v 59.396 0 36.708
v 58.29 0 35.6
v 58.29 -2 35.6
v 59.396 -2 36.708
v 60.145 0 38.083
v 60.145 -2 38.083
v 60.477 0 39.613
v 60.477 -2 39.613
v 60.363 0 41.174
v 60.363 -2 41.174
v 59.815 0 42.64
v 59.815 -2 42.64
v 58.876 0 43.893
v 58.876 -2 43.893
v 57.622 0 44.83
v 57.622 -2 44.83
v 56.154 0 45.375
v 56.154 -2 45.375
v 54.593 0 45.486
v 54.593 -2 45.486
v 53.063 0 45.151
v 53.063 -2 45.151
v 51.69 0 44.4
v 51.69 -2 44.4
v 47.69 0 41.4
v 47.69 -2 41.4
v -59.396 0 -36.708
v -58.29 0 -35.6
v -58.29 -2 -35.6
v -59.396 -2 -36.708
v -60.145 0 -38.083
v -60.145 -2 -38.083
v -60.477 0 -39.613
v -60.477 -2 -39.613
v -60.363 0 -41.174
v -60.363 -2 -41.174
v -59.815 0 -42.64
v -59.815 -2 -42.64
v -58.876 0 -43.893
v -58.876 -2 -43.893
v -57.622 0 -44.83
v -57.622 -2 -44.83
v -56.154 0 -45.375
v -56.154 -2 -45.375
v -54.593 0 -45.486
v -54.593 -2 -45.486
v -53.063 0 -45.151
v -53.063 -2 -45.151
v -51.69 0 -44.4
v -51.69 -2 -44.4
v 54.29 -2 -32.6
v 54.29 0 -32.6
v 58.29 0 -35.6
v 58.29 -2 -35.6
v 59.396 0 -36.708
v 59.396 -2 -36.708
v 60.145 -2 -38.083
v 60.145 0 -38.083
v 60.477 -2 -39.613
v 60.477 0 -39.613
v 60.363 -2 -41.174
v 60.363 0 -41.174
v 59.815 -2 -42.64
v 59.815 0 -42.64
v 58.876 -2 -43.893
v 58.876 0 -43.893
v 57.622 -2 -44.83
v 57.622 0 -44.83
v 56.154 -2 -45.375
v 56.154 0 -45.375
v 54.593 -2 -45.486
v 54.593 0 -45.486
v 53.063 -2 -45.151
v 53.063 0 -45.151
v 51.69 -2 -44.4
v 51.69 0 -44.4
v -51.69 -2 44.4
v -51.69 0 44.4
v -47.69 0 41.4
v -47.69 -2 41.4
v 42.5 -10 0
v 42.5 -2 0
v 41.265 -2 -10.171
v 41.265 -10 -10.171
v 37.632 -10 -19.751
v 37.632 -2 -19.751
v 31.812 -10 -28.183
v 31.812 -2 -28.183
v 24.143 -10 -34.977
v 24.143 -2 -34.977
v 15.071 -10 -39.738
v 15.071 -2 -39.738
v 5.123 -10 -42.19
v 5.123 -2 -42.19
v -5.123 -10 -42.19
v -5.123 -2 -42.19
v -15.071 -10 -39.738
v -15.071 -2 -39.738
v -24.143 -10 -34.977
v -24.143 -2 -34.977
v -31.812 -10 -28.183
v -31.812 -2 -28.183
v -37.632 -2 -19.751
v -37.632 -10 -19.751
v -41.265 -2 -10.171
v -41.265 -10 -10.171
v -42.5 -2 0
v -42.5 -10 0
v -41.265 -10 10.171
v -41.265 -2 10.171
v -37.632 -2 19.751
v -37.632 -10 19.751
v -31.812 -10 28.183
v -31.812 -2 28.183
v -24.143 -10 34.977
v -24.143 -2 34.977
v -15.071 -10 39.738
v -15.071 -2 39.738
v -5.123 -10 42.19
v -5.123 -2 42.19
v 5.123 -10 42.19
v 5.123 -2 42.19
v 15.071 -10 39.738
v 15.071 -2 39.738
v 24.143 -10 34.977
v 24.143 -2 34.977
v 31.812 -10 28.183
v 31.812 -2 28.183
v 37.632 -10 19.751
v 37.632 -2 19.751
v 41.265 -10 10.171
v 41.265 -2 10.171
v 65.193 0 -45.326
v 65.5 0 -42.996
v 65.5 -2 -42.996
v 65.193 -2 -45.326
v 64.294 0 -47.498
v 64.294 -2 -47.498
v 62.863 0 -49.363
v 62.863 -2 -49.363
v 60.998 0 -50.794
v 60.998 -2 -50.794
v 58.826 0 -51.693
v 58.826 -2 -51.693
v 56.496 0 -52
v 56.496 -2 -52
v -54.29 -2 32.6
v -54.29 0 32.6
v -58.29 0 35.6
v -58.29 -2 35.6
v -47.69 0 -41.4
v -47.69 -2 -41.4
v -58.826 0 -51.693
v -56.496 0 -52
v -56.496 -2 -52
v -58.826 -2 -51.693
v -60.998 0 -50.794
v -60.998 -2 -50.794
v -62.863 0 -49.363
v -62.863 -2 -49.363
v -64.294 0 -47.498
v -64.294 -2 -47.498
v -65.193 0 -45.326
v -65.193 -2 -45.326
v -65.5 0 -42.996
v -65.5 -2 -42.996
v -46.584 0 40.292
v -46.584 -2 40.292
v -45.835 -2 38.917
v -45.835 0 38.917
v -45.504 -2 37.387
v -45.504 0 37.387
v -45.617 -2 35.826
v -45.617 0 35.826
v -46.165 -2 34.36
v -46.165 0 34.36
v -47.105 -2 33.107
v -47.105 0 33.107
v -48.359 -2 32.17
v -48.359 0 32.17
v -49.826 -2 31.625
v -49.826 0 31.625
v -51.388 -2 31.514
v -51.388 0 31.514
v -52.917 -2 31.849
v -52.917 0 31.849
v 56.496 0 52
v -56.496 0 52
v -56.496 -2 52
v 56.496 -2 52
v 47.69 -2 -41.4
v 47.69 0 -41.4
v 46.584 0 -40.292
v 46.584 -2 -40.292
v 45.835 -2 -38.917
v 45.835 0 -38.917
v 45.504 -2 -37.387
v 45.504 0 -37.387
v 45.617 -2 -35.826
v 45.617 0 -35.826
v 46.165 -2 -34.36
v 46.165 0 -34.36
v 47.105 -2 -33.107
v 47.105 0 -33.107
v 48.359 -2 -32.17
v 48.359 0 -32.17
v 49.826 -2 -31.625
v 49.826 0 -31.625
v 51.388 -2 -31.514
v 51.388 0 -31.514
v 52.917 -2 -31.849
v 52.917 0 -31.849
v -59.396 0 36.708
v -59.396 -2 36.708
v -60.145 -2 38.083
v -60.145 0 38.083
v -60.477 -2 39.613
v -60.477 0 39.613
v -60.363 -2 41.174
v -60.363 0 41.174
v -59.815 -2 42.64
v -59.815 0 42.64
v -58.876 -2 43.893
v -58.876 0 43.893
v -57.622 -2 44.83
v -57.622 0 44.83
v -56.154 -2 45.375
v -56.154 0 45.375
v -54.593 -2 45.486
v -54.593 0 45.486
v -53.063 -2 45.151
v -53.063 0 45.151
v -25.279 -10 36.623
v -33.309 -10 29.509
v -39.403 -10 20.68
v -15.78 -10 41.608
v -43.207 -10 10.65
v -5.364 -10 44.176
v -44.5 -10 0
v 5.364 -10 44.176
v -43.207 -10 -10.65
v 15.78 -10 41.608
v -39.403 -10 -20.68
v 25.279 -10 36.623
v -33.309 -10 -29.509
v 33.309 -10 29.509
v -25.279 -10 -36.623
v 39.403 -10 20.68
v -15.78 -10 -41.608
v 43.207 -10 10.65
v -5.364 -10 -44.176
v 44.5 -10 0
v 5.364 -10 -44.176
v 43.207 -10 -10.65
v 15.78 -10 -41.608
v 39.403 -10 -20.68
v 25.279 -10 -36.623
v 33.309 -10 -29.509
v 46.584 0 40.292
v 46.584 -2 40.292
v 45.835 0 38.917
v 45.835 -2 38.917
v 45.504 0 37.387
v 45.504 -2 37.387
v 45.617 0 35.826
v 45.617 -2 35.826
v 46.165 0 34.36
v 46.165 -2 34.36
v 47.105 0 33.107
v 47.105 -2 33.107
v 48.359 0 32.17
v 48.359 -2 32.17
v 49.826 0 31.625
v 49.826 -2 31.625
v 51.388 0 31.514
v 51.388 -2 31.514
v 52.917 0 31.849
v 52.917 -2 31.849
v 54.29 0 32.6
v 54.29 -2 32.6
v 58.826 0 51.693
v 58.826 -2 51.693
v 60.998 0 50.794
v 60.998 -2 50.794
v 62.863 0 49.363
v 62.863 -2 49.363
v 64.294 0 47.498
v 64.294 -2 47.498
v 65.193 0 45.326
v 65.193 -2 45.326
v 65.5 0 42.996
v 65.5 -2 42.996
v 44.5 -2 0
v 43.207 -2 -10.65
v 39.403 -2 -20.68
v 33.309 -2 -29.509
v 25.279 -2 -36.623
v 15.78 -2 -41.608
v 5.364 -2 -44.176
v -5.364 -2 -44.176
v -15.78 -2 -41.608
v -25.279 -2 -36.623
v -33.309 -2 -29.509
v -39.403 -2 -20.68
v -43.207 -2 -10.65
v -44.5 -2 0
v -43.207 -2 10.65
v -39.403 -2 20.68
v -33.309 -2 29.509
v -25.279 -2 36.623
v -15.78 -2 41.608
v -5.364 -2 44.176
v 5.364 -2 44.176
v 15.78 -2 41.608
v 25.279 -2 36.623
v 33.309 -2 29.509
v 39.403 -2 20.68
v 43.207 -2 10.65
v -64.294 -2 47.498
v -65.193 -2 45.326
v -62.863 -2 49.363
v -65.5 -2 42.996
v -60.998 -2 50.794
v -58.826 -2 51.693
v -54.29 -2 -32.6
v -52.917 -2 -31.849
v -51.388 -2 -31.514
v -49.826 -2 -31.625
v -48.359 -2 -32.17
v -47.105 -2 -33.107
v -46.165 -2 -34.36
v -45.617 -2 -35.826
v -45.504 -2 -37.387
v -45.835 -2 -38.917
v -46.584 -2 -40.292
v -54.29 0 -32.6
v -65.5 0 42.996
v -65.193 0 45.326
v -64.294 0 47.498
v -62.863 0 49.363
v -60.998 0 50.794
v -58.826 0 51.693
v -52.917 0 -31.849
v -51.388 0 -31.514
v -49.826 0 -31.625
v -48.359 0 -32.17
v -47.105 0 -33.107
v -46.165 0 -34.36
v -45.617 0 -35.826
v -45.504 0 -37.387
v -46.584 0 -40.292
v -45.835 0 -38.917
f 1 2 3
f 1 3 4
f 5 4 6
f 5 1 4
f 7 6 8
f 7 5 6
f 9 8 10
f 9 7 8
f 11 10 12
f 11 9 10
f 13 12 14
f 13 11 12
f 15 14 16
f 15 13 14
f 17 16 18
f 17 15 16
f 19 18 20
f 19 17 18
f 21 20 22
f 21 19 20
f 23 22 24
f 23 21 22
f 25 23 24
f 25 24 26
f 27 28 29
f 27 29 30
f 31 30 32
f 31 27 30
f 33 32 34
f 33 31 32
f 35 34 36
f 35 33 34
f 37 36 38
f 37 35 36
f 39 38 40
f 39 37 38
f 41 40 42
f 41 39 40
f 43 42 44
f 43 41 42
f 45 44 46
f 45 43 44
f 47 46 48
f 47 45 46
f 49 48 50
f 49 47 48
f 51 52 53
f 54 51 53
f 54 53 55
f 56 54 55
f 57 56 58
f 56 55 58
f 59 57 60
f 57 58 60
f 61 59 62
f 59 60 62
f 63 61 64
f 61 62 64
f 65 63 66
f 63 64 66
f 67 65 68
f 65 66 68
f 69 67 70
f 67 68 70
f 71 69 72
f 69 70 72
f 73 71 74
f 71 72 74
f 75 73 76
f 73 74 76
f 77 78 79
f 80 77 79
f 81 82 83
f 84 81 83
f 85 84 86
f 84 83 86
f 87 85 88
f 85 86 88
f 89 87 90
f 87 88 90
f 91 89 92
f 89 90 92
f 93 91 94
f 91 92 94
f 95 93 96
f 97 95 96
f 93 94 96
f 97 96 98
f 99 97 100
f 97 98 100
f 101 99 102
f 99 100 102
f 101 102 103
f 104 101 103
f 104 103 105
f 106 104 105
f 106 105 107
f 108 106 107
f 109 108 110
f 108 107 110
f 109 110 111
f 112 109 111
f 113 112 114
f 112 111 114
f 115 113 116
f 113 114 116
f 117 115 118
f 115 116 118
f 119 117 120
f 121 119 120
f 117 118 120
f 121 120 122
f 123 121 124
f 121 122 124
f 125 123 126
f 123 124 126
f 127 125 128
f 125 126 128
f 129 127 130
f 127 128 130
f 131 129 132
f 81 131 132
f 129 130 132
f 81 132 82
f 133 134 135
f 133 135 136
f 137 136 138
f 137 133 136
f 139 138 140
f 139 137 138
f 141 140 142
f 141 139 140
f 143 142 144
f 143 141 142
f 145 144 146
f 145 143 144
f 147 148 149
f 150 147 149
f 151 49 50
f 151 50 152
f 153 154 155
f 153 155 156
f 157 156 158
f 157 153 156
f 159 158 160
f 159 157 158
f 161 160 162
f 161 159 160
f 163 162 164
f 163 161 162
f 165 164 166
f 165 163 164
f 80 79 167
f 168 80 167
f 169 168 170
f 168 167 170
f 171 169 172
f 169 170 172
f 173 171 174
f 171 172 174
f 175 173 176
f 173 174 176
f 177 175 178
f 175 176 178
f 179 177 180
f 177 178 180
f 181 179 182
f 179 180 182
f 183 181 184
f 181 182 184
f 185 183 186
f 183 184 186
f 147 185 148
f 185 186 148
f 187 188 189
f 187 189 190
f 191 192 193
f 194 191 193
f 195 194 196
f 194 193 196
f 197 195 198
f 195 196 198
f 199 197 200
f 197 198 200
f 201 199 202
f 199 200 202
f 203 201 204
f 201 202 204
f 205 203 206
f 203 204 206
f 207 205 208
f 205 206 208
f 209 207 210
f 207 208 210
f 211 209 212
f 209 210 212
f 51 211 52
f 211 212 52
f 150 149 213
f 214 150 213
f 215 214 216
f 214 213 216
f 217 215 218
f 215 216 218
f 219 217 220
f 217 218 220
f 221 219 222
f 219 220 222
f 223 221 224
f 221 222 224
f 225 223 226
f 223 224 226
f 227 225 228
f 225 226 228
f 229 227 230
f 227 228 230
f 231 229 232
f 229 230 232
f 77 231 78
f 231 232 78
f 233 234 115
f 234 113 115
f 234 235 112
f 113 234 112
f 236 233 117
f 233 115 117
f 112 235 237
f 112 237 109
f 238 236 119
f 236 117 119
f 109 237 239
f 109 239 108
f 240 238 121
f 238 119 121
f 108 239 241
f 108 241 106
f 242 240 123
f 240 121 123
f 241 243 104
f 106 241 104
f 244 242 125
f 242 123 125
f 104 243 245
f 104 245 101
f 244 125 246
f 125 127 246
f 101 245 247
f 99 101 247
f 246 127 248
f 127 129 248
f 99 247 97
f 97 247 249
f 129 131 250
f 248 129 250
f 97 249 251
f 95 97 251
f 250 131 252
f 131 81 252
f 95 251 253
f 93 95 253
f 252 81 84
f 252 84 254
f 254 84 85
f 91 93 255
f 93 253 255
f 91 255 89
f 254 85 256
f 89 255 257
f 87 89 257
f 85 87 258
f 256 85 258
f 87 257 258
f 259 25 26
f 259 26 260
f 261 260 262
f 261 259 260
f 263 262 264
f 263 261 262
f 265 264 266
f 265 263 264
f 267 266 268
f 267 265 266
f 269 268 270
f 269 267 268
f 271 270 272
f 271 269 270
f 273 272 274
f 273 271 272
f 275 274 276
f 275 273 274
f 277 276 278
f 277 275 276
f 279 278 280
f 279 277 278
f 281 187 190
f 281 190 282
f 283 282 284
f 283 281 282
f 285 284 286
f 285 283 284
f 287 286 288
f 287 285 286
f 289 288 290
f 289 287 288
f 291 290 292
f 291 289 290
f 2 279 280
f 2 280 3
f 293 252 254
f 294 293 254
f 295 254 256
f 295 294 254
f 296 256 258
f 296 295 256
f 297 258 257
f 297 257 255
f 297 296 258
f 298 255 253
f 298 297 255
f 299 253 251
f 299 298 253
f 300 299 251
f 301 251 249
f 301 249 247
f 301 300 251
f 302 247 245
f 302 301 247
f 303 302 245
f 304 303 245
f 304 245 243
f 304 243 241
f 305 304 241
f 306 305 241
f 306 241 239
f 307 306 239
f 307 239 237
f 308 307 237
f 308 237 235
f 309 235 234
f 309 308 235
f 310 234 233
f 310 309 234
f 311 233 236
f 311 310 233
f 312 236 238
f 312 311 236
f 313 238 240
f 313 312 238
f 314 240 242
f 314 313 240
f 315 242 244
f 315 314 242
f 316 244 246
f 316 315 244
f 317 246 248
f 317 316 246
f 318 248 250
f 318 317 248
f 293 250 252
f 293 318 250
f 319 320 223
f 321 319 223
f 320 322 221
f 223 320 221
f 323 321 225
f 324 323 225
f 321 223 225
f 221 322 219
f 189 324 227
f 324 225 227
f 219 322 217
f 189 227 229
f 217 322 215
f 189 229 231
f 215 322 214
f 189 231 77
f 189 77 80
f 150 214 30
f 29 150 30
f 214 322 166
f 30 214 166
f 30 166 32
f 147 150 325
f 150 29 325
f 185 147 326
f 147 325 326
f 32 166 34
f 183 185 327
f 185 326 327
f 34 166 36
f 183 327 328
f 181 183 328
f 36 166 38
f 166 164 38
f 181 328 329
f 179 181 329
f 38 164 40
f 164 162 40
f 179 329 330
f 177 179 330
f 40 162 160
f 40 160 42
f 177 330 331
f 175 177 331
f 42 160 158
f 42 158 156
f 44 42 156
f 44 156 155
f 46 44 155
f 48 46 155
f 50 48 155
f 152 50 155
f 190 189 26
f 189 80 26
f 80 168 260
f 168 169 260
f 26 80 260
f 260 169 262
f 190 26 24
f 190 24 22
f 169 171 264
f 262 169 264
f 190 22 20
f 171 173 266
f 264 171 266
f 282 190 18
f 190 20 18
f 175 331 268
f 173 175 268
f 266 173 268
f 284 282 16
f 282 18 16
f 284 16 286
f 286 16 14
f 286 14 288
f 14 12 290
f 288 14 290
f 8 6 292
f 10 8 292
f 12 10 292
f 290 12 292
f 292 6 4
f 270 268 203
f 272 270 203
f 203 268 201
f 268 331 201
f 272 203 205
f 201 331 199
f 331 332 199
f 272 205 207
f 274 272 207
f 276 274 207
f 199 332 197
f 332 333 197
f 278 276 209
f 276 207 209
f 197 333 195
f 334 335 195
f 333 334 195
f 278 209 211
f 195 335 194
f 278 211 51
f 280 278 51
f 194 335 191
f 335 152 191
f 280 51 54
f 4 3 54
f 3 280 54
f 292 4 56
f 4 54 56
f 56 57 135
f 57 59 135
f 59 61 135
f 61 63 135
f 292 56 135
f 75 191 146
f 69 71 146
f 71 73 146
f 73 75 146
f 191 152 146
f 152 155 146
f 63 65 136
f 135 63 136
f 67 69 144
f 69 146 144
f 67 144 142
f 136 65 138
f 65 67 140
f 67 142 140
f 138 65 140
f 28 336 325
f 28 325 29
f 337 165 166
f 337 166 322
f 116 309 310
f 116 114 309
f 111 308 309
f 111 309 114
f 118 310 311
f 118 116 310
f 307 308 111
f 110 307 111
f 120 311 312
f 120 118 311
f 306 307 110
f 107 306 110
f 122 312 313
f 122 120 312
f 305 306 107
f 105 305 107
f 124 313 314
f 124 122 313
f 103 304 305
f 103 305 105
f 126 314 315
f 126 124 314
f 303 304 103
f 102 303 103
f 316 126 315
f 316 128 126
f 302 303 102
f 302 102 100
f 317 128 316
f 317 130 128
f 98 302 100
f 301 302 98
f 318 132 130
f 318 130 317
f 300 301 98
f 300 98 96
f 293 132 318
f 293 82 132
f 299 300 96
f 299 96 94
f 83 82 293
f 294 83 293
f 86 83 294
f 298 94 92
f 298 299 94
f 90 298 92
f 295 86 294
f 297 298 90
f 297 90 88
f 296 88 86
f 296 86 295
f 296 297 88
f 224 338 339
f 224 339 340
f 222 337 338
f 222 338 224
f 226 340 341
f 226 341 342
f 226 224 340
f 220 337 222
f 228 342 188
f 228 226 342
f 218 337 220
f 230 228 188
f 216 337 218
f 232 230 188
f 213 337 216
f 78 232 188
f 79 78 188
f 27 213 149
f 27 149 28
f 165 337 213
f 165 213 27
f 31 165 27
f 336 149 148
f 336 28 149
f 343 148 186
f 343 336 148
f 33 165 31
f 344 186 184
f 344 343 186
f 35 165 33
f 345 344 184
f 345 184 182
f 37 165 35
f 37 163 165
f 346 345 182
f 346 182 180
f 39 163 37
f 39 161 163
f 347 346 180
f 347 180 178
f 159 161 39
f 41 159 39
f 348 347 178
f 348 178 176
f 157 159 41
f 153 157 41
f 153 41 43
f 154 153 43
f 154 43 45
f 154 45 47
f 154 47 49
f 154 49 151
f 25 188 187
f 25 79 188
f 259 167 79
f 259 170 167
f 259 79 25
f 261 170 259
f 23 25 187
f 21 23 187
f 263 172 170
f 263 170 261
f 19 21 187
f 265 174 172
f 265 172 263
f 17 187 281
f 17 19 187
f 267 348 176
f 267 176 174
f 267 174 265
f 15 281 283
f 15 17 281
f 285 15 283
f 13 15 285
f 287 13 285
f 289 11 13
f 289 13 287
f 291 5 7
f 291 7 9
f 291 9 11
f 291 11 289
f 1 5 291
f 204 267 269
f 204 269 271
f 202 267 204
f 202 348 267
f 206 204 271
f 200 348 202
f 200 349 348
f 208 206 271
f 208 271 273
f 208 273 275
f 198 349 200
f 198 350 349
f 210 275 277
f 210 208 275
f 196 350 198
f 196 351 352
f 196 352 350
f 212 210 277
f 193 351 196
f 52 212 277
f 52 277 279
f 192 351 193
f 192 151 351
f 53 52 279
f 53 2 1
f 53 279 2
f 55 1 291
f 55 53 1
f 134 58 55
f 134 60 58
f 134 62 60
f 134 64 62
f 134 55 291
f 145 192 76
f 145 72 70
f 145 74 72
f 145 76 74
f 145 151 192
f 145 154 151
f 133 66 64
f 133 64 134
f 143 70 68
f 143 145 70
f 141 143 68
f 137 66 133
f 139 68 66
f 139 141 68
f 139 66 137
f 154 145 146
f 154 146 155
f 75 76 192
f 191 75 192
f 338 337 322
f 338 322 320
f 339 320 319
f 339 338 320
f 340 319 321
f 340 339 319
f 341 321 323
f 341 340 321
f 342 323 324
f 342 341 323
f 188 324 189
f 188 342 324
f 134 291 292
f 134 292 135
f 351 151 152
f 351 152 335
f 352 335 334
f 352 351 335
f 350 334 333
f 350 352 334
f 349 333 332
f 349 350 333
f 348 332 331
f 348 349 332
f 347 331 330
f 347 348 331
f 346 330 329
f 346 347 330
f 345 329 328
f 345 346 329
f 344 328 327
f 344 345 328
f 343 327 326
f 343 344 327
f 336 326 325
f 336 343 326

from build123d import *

# Parameters (mm, degrees)
BRIDA_BASE1_DEPTH     = 2
CROQUIS6_R            = 44.5
CROQUIS6_R_2          = 42.5
EXTRUIR_L_MINA1_DEPTH = 8


# Sheet-metal steps are written as plain solids
with BuildPart() as part:
    # Croquis1 → Brida base1 (new body)
    with BuildSketch(Plane(origin=(0, 0, 0), x_dir=(1, 0, 0), z_dir=(0, 1, 0))):
        with BuildLine():
            Line((-56.495613698, -52), (56.495613698, -52))
            ThreePointArc((56.495613698, -52), (62.862676312, -49.362676312), (65.5, -42.995613698))
            Line((65.5, -42.995613698), (65.5, 42.995613698))
            ThreePointArc((65.5, 42.995613698), (62.862676312, 49.362676312), (56.495613698, 52))
            Line((56.495613698, 52), (-56.495613698, 52))
            ThreePointArc((-56.495613698, 52), (-62.862676312, 49.362676312), (-65.5, 42.995613698))
            Line((-65.5, 42.995613698), (-65.5, -42.995613698))
            ThreePointArc((-65.5, -42.995613698), (-62.862676312, -49.362676312), (-56.495613698, -52))
        make_face()
        with BuildLine():
            Line((-51.690195136, 44.4), (-47.690195136, 41.4))
            ThreePointArc((-47.690195136, 41.4), (-46.590195136, 33.7), (-54.290195136, 32.6))
            Line((-54.290195136, 32.6), (-58.290195136, 35.6))
            ThreePointArc((-58.290195136, 35.6), (-59.390195136, 43.3), (-51.690195136, 44.4))
        make_face(mode=Mode.SUBTRACT)
        with BuildLine():
            Line((51.690195136, 44.4), (47.690195136, 41.4))
            ThreePointArc((47.690195136, 41.4), (46.590195136, 33.7), (54.290195136, 32.6))
            Line((54.290195136, 32.6), (58.290195136, 35.6))
            ThreePointArc((58.290195136, 35.6), (59.390195136, 43.3), (51.690195136, 44.4))
        make_face(mode=Mode.SUBTRACT)
        with BuildLine():
            Line((-51.690195136, -44.4), (-47.690195136, -41.4))
            ThreePointArc((-47.690195136, -41.4), (-46.590195136, -33.7), (-54.290195136, -32.6))
            Line((-54.290195136, -32.6), (-58.290195136, -35.6))
            ThreePointArc((-58.290195136, -35.6), (-59.390195136, -43.3), (-51.690195136, -44.4))
        make_face(mode=Mode.SUBTRACT)
        with BuildLine():
            Line((51.690195136, -44.4), (47.690195136, -41.4))
            ThreePointArc((47.690195136, -41.4), (46.590195136, -33.7), (54.290195136, -32.6))
            Line((54.290195136, -32.6), (58.290195136, -35.6))
            ThreePointArc((58.290195136, -35.6), (59.390195136, -43.3), (51.690195136, -44.4))
        make_face(mode=Mode.SUBTRACT)
    extrude(amount=-BRIDA_BASE1_DEPTH)


with BuildPart() as body_2:
    # Croquis6 → Extruir-Lámina1 (new body)
    with BuildSketch(Plane(origin=(0, -2, 0), x_dir=(1, 0, 0), z_dir=(0, 1, 0))):
        Circle(CROQUIS6_R)
        Circle(CROQUIS6_R_2, mode=Mode.SUBTRACT)
    extrude(amount=-EXTRUIR_L_MINA1_DEPTH)


solid = Compound([part.part, body_2.part])
